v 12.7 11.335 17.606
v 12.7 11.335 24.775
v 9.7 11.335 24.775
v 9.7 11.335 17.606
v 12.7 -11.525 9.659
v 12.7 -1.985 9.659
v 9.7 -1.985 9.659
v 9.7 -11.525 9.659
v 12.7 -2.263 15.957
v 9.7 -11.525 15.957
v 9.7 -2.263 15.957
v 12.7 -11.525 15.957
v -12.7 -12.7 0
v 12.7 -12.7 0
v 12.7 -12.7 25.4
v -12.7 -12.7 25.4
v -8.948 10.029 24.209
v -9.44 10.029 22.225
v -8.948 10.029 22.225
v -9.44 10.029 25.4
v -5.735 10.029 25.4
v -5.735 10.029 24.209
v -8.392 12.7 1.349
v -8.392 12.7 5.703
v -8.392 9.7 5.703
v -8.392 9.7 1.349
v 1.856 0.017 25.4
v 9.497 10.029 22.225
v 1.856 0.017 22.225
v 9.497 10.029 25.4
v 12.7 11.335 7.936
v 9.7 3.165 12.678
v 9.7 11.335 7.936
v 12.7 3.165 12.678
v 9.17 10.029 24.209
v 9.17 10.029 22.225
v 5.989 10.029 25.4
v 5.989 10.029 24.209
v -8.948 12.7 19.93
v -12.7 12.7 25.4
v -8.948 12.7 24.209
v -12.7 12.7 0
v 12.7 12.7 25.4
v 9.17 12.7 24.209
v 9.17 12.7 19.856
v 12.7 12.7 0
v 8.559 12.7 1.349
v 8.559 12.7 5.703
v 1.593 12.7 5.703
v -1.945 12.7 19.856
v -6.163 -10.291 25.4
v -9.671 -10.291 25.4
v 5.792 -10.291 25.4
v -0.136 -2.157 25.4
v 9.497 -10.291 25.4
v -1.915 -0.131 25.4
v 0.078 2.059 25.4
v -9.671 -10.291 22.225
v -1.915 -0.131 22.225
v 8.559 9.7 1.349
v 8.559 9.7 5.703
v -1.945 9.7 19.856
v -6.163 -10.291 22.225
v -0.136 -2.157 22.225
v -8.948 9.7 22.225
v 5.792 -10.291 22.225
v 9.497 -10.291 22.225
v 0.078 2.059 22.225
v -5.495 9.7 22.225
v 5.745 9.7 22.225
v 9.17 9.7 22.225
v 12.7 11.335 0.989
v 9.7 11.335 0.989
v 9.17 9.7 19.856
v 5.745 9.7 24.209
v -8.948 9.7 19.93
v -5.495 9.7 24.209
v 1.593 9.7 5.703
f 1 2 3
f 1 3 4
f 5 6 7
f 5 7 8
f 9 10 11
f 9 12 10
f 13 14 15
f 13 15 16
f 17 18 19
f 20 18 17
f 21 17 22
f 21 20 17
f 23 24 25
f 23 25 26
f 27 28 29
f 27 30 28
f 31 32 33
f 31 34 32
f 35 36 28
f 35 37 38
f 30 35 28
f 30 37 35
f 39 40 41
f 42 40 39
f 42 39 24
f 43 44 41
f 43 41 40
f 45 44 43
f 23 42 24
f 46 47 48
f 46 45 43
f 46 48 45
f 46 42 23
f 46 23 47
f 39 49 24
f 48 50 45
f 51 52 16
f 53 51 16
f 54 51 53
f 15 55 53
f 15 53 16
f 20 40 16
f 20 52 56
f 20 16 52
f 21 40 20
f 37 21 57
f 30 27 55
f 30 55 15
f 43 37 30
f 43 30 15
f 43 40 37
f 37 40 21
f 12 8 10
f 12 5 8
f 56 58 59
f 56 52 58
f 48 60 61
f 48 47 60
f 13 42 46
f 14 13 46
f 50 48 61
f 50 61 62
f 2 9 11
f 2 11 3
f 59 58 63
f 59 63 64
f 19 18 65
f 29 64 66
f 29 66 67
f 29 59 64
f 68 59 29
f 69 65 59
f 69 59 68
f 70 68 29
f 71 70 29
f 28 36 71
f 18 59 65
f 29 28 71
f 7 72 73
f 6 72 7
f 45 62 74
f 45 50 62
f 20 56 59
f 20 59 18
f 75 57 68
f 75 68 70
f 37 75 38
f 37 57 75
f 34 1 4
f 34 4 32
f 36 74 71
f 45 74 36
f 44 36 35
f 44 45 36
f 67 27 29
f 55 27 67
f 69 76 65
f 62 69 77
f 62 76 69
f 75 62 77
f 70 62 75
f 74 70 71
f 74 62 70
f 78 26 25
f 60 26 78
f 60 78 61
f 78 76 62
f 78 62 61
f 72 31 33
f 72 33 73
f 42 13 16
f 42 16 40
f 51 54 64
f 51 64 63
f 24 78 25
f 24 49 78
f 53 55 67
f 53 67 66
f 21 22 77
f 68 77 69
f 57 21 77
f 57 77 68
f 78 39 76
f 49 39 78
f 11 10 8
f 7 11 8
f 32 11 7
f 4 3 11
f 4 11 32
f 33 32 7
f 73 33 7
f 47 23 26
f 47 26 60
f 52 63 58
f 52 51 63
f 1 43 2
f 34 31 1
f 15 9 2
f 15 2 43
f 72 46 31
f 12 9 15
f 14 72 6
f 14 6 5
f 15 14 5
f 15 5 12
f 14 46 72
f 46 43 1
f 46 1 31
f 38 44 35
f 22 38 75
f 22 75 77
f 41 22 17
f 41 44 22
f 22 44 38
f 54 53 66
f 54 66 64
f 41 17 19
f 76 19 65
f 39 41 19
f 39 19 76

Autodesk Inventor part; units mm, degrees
ref_plane "YZ Plane" through (0, 0, 0) normal (1, 0, 0) x (0, 1, 0)
ref_plane "XZ Plane" through (0, 0, 0) normal (0, 1, 0) x (-1, 0, 0)
ref_plane "XY Plane" through (0, 0, 0) normal (0, 0, 1) x (1, 0, 0)
sketch "Sketch3" plane through (0, 0, 0) normal (0, 0, 1) x (1, 0, 0)
  line L0 (12.7, -12.7) -> (-12.7, -12.7)
  line L1 (-12.7, -12.7) -> (-12.7, 12.7)
  line L2 (-12.7, 12.7) -> (12.7, 12.7)
  line L3 (12.7, 12.7) -> (12.7, -12.7)
  line L4 (12.7, -12.7) -> (-12.7, 12.7) construction
  line L5 (-12.7, -12.7) -> (12.7, 12.7) construction
  point P0 (0, 0)
  dimension "d0" = 25.4
  dimension "d1" = 25.4
extrude "Cubo" add sketch "Sketch3" along normal blind 25.4
sketch "Sketch5" plane through (0, 0, 25.4) normal (0, 0, 1) x (1, 0, 0)
  line L0 (-12.1868, 12.0555) -> (12.0292, 12.0555) construction
  line L1 (12.0292, 12.0555) -> (12.0292, -12.3181) construction
  line L2 (12.0292, -12.3181) -> (-12.1868, -12.3181) construction
  line L3 (-12.1868, -12.3181) -> (-12.1868, 12.0555) construction
  line L4 (9.4966, -10.2913) -> (5.7916, -10.2913)
  line L5 (5.7916, -10.2913) -> (-0.1365, -2.1567)
  line L6 (-0.1365, -2.1567) -> (-6.1633, -10.2913)
  line L7 (-6.1633, -10.2913) -> (-9.6707, -10.2913)
  line L8 (-9.6707, -10.2913) -> (-1.9149, -0.1313)
  line L9 (-1.9149, -0.1313) -> (-9.4402, 10.0287)
  line L10 (-9.4402, 10.0287) -> (-5.7352, 10.0287)
  line L11 (-5.7352, 10.0287) -> (0.0776, 2.0588)
  line L12 (0.0776, 2.0588) -> (5.9892, 10.0287)
  line L13 (5.9892, 10.0287) -> (9.4966, 10.0287)
  line L14 (9.4966, 10.0287) -> (1.856, 0.0169)
  line L15 (1.856, 0.0169) -> (9.4966, -10.2913)
  point P0 (0, 0)
extrude "X" cut sketch "Sketch5" against normal blind 3.175
sketch "Esboço9" plane through (12.7, -12.7, 0) normal (1, 0, 0) x (0, 0, -1)
  line L0 (-24.9757, 24.9816) -> (-0.1587, 24.9816) construction
  line L1 (-0.1587, 24.9816) -> (-0.1587, 0.228) construction
  line L2 (-0.1587, 0.228) -> (-24.9757, 0.228) construction
  line L3 (-24.9757, 0.228) -> (-24.9757, 24.9816) construction
  line L4 (-0.989, 24.0348) -> (-9.6587, 10.7152)
  line L5 (-9.6587, 10.7152) -> (-9.6587, 1.1748)
  line L6 (-9.6587, 1.1748) -> (-15.9573, 1.1748)
  line L7 (-15.9573, 1.1748) -> (-15.9573, 10.4374)
  line L8 (-15.9573, 10.4374) -> (-24.7752, 24.0348)
  line L9 (-24.7752, 24.0348) -> (-17.606, 24.0348)
  line L10 (-17.606, 24.0348) -> (-12.6783, 15.8652)
  line L11 (-12.6783, 15.8652) -> (-7.9359, 24.0348)
  line L12 (-7.9359, 24.0348) -> (-0.989, 24.0348)
  point P0 (0, 12.7)
extrude "Extrusão6" cut sketch "Esboço9" against normal blind 3
sketch "Esboço10" plane through (-12.7, 12.7, 0) normal (0, 1, 0) x (1, 0, 0)
  line L0 (0.3012, -0.2854) -> (25.0988, -0.2854) construction
  line L1 (25.0988, -0.2854) -> (25.0988, -25.2732) construction
  line L2 (25.0988, -25.2732) -> (0.3012, -25.2732) construction
  line L3 (0.3012, -25.2732) -> (0.3012, -0.2854) construction
  line L4 (21.8699, -24.2093) -> (3.7524, -24.2093)
  line L5 (3.7524, -24.2093) -> (3.7524, -19.93)
  line L6 (3.7524, -19.93) -> (14.2932, -5.7027)
  line L7 (14.2932, -5.7027) -> (4.3081, -5.7027)
  line L8 (4.3081, -5.7027) -> (4.3081, -1.3493)
  line L9 (4.3081, -1.3493) -> (21.2586, -1.3493)
  line L10 (21.2586, -1.3493) -> (21.2586, -5.7027)
  line L11 (21.2586, -5.7027) -> (10.7549, -19.8559)
  line L12 (10.7549, -19.8559) -> (21.8699, -19.8559)
  line L13 (21.8699, -19.8559) -> (21.8699, -24.2093)
  point P0 (12.7, 0)
extrude "Extrusão7" cut sketch "Esboço10" against normal blind 3
properties part number "Cubo_3DPrint"
